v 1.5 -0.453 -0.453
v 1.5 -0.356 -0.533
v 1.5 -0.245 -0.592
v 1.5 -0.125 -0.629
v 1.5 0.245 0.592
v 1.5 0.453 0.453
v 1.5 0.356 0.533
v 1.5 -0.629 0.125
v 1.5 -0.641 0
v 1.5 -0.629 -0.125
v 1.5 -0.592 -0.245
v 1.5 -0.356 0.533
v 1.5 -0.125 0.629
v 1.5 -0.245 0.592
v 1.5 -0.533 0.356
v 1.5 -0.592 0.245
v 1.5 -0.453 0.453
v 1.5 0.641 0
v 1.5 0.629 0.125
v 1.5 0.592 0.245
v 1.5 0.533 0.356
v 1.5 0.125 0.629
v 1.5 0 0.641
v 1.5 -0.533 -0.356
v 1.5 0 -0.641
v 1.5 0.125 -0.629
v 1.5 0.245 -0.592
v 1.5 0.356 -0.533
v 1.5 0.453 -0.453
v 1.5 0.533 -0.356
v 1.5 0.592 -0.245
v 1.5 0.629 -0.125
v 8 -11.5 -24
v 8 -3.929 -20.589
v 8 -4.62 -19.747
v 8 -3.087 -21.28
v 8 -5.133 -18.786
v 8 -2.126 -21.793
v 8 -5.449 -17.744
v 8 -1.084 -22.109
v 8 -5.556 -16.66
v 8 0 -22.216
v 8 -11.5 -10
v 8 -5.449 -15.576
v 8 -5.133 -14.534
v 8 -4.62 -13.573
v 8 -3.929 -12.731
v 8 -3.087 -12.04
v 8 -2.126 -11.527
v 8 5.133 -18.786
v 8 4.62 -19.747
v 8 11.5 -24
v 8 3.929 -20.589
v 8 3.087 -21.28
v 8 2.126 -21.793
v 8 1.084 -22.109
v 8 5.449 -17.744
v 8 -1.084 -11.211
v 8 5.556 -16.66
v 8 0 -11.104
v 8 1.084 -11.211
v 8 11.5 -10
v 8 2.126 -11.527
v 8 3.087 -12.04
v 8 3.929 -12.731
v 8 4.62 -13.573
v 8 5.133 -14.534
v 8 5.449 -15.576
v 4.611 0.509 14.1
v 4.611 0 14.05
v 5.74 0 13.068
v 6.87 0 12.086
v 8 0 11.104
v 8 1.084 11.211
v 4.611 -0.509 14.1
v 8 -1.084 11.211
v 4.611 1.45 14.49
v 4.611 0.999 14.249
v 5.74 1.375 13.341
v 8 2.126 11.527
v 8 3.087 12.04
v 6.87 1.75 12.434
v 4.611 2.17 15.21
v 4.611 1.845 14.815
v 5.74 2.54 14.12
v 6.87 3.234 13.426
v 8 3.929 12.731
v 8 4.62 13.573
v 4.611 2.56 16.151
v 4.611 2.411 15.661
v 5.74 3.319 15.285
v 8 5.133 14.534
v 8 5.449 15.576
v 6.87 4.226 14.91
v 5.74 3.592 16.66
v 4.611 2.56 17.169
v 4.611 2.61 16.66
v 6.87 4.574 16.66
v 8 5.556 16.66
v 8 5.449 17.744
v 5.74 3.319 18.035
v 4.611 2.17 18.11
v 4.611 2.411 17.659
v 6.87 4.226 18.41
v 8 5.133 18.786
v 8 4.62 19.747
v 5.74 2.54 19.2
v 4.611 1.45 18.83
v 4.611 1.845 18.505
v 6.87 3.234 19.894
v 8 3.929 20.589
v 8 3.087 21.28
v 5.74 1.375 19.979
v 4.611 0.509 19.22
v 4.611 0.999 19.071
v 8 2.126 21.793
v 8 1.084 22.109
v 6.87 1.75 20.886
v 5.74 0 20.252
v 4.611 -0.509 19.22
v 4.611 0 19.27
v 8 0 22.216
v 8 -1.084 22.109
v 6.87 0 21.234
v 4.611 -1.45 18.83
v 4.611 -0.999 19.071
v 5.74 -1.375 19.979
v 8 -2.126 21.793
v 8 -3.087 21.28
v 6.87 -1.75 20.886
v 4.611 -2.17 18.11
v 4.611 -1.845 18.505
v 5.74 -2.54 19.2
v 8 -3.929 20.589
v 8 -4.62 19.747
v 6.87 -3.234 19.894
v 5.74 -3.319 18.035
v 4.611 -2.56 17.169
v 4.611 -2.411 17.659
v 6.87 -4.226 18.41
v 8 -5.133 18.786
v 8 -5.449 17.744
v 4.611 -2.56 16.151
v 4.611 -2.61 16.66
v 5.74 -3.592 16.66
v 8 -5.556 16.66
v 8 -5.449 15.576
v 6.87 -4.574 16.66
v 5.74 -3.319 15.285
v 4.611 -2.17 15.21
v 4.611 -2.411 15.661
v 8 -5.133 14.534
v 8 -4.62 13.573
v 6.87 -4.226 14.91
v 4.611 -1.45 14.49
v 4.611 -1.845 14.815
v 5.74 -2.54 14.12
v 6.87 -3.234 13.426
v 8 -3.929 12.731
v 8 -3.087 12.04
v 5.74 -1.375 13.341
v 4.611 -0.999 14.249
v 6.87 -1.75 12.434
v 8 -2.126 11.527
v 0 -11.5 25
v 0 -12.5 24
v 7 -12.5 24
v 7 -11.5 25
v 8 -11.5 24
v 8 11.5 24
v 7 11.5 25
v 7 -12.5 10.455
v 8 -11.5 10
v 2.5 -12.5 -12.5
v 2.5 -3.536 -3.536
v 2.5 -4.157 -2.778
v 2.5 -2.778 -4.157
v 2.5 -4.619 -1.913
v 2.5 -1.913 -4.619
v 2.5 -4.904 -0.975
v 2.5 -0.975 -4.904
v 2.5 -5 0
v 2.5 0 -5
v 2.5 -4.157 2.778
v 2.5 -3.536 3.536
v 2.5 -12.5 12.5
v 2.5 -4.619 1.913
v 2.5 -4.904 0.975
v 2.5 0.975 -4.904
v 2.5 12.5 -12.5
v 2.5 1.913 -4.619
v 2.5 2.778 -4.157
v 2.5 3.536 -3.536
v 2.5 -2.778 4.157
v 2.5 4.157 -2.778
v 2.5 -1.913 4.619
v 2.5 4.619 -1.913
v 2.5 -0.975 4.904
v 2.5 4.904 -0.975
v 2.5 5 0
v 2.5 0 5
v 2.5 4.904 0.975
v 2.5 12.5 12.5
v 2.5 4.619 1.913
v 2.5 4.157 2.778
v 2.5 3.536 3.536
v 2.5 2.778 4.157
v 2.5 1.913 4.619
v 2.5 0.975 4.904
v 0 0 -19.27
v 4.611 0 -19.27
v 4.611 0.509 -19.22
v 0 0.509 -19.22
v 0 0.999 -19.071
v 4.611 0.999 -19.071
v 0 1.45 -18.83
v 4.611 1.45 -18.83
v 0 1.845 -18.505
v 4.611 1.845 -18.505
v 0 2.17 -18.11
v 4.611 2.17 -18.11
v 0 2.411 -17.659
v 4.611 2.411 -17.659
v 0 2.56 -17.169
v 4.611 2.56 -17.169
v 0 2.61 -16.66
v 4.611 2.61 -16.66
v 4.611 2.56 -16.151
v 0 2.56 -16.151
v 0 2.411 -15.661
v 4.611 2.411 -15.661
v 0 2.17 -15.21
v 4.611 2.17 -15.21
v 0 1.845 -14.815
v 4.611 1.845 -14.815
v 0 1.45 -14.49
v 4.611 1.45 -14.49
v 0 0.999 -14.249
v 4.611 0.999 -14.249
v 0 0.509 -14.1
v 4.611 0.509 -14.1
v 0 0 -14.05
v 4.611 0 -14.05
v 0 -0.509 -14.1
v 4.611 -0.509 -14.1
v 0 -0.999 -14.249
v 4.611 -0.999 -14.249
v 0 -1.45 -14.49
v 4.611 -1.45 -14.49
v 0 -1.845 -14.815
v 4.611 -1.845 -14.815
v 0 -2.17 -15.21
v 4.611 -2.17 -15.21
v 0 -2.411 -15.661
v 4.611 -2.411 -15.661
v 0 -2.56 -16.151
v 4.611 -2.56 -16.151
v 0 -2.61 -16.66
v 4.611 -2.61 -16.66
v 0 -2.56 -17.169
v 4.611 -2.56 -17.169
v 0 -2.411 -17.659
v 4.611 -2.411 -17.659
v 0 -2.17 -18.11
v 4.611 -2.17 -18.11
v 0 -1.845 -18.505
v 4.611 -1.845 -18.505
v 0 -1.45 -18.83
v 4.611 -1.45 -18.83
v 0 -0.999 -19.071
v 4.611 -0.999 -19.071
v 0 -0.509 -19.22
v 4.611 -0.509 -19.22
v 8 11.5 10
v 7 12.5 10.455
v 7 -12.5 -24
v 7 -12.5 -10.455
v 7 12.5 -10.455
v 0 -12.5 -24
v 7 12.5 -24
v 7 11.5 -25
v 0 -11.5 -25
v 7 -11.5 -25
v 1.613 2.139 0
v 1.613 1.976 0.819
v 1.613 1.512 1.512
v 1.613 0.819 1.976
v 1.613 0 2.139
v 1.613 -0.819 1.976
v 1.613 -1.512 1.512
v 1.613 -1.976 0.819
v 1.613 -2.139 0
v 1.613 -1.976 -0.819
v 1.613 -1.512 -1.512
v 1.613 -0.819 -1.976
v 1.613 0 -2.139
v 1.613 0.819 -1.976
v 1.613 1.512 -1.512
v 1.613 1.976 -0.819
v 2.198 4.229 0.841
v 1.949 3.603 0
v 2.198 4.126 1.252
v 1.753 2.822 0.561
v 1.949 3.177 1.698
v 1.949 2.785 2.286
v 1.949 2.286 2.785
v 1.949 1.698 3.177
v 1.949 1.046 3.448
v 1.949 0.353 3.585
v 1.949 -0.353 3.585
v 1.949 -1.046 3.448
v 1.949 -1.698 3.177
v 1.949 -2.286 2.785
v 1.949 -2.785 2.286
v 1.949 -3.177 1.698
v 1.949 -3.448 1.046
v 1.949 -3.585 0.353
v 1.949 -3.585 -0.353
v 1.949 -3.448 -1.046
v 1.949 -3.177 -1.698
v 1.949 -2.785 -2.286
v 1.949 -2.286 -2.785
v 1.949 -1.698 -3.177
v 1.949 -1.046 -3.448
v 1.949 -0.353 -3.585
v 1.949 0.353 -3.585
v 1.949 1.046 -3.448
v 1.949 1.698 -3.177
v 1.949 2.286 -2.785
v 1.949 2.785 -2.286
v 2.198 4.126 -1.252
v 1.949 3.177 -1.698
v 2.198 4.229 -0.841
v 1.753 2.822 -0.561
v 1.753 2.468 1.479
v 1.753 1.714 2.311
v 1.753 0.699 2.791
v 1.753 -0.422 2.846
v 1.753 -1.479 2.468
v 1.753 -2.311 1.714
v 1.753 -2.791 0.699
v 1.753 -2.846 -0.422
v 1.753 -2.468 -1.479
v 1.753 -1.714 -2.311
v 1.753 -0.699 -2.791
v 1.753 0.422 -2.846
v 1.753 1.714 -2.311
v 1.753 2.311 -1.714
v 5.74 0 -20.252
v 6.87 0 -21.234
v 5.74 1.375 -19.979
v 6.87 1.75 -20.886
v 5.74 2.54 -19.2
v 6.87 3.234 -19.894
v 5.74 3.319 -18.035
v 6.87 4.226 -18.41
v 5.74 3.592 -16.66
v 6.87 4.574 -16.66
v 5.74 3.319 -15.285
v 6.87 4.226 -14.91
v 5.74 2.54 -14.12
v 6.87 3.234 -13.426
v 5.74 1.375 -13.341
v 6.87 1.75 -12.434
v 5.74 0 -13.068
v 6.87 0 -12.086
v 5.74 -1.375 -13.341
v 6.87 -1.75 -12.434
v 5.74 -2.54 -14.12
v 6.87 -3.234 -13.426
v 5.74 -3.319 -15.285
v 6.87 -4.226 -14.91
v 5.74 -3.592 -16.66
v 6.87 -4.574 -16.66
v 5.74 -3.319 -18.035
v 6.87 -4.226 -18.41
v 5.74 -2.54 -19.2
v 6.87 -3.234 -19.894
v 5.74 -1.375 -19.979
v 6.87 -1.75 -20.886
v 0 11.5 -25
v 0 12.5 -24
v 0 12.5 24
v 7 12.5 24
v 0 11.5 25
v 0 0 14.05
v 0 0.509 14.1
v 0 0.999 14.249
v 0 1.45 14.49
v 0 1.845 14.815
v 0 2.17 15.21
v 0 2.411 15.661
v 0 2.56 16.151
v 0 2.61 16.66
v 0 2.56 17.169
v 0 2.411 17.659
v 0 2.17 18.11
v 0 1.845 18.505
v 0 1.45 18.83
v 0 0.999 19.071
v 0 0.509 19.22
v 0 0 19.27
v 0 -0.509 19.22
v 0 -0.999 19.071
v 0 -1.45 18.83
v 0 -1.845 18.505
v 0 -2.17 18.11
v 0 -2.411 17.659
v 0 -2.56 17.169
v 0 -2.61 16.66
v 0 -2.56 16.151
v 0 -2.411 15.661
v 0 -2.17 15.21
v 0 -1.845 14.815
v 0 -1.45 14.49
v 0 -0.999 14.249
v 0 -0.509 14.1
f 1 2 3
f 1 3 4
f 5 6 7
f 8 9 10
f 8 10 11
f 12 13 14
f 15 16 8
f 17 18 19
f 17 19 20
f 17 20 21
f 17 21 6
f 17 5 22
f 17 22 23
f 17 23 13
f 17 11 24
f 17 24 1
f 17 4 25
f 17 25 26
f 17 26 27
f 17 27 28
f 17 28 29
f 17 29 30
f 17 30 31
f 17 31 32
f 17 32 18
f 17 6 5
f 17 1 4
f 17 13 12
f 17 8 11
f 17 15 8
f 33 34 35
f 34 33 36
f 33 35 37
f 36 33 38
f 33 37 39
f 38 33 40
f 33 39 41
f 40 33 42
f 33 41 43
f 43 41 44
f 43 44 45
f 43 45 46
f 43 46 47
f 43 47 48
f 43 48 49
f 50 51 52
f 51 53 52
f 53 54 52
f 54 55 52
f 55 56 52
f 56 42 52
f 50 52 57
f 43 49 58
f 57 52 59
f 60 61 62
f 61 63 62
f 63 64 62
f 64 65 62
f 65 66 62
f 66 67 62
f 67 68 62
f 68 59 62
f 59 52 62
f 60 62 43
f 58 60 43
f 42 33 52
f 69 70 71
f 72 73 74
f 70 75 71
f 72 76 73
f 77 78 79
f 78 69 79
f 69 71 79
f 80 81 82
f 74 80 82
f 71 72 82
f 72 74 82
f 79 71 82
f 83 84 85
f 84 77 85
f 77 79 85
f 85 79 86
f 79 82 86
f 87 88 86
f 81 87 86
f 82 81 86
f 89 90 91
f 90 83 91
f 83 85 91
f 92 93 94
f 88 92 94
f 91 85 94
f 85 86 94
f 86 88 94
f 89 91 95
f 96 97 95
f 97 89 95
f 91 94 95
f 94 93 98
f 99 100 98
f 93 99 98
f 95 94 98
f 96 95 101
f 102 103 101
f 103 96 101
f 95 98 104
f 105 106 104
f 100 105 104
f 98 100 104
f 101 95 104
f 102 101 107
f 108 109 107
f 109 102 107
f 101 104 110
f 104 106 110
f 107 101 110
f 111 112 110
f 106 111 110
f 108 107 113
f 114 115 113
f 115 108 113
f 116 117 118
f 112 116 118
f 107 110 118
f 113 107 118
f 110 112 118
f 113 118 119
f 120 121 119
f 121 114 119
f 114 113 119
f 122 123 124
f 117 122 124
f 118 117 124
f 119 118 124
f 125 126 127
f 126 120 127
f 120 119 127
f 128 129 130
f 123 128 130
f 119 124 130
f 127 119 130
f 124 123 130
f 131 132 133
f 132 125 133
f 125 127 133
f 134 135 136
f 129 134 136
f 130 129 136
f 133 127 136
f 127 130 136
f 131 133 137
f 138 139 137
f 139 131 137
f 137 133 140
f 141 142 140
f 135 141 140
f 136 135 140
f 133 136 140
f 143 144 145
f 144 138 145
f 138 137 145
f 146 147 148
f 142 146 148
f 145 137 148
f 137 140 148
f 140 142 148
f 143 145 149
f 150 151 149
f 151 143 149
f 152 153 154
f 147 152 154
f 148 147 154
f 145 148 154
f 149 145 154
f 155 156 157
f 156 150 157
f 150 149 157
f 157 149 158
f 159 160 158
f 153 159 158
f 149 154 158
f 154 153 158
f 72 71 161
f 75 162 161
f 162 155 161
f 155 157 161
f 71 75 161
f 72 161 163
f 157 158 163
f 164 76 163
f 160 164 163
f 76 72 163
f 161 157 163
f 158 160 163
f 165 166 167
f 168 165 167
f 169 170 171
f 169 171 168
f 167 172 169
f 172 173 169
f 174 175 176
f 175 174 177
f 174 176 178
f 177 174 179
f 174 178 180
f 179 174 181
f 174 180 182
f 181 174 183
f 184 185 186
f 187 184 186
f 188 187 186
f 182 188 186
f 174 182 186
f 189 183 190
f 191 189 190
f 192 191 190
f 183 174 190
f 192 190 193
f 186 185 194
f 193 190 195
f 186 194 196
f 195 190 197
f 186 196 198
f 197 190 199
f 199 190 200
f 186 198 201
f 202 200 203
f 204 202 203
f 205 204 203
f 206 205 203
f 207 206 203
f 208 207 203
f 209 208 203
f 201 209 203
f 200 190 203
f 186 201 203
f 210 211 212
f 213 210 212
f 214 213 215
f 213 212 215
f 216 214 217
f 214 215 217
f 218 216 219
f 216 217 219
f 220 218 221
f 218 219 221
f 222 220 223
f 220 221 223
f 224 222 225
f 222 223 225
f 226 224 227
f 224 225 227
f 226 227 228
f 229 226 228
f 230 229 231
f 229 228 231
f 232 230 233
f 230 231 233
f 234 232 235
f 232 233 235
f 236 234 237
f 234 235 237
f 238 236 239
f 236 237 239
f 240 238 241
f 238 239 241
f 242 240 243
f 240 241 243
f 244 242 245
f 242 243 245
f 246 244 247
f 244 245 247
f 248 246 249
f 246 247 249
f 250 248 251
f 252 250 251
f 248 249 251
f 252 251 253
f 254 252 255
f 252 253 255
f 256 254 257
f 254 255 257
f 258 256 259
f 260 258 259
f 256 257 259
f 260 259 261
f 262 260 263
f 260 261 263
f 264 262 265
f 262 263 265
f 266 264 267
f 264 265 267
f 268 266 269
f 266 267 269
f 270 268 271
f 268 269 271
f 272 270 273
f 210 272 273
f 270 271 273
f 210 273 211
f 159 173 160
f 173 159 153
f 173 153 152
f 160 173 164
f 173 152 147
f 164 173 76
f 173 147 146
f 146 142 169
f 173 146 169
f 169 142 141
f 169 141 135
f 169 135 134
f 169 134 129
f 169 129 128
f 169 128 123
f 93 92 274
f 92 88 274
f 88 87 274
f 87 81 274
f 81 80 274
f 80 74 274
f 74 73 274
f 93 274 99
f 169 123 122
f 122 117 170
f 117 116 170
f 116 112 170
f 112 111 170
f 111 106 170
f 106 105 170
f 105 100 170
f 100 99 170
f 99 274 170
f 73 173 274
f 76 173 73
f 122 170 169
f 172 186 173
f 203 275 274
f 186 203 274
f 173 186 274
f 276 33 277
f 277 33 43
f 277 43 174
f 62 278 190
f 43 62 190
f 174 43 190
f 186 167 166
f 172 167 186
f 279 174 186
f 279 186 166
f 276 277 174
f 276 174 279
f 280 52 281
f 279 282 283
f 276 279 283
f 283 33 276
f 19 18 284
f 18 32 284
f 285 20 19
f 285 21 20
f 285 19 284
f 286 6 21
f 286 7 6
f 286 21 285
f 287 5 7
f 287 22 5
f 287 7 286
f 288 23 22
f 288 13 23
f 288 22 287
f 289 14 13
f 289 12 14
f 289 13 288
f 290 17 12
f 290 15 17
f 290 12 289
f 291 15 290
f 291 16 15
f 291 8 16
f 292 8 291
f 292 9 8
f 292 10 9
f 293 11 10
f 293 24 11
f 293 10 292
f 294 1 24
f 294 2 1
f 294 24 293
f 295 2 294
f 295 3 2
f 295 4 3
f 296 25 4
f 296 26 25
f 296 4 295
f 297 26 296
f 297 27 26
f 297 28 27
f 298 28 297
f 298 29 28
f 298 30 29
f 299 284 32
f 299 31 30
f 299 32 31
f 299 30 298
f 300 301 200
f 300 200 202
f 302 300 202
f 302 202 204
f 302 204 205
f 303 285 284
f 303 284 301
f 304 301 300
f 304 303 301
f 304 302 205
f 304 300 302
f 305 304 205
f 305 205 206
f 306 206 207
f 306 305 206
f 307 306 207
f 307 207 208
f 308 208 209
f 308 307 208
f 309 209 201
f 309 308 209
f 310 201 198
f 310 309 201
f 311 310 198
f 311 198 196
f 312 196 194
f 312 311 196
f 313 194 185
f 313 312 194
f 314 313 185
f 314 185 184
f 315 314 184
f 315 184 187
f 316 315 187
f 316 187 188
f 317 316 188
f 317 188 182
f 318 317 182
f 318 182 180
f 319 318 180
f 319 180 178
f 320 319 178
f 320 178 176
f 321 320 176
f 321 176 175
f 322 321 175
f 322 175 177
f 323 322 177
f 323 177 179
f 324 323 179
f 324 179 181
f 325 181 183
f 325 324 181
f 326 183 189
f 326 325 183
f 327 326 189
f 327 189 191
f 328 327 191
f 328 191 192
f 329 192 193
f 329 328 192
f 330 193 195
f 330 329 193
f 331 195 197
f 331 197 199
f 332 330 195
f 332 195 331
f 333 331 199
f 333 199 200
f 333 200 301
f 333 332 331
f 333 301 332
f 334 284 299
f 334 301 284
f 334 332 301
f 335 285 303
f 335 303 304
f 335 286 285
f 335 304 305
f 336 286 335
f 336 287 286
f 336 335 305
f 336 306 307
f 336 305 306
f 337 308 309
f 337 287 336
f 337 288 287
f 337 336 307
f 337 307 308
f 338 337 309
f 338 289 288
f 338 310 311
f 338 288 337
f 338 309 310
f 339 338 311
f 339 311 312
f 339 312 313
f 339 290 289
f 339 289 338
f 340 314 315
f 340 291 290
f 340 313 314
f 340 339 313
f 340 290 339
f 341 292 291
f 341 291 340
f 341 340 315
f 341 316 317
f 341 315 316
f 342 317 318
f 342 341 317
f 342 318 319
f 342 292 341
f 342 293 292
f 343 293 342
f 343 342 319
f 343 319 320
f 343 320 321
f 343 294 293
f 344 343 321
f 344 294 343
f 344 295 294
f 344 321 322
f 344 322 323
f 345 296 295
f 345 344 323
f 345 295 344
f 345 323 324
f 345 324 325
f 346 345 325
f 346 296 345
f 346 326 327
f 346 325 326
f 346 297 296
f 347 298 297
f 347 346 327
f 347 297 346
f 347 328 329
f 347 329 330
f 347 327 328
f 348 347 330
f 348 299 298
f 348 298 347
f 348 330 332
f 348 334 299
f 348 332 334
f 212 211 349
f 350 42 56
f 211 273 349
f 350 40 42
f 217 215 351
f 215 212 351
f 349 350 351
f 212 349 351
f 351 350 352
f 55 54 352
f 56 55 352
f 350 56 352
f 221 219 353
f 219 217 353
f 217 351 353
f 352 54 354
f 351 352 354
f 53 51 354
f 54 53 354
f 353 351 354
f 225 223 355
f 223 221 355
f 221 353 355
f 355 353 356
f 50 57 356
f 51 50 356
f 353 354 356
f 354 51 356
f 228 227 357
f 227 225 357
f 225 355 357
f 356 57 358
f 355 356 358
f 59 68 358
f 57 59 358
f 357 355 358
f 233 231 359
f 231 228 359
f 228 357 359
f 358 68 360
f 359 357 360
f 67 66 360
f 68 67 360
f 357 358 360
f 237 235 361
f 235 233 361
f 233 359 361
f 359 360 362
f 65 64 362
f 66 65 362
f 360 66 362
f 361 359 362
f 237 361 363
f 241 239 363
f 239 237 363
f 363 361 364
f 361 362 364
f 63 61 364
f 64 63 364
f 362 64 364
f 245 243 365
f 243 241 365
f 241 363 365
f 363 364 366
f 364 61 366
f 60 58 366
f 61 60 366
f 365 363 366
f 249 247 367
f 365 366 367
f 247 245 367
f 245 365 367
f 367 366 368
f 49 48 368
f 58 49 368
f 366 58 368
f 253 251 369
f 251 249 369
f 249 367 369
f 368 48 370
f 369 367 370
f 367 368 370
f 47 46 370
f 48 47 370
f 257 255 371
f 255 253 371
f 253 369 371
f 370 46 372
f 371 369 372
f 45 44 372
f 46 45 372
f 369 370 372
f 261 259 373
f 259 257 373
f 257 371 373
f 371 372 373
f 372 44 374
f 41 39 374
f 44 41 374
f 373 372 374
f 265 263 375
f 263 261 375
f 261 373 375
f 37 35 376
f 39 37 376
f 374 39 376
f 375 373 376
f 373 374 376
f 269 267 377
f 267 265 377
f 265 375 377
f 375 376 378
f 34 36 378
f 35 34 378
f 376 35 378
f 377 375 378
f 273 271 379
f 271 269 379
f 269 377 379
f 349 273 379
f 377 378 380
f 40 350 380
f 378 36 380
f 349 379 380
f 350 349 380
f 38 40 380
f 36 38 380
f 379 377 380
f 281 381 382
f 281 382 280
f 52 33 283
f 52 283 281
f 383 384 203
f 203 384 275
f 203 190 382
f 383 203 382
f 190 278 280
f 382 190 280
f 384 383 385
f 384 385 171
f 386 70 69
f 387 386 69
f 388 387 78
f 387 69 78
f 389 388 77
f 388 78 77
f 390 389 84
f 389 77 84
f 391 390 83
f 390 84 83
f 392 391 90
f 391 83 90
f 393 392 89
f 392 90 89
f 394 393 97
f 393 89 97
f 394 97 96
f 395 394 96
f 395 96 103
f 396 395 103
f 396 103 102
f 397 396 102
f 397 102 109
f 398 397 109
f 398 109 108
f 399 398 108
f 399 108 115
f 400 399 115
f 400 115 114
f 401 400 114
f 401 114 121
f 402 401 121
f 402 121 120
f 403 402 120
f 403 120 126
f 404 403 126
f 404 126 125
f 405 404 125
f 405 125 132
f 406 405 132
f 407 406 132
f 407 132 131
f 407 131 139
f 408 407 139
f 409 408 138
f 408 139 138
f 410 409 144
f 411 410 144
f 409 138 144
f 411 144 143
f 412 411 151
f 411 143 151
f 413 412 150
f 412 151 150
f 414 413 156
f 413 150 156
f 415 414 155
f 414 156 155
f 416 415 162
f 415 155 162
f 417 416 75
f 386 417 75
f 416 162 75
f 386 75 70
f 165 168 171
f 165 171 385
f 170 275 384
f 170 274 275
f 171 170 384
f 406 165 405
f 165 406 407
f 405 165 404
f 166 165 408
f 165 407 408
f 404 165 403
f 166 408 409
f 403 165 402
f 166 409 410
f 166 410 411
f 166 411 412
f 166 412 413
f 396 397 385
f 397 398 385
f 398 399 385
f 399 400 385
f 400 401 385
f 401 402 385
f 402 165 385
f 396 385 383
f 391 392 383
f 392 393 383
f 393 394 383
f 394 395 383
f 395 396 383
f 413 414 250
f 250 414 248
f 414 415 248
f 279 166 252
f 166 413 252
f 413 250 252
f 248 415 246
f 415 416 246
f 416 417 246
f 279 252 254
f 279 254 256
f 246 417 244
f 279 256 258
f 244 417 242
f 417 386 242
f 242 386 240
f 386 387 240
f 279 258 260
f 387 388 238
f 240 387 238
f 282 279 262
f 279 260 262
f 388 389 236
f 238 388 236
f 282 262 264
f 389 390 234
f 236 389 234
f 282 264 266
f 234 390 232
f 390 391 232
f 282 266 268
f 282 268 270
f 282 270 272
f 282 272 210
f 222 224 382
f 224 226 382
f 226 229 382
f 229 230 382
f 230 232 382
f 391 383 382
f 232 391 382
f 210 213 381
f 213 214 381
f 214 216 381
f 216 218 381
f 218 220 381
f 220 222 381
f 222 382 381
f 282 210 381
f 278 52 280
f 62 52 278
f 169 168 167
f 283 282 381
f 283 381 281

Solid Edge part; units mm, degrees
sketch "Sketch1" plane through (0, 0, 0) normal (0, -1, 0) x (1, 0, 0)
  line L0 (0, 25) -> (0, -25)
  line L1 (0, -25) -> (8, -25)
  line L2 (8, -25) -> (8, -10)
  line L3 (8, -10) -> (2.5, -12.5)
  line L4 (2.5, -12.5) -> (2.5, 12.5)
  line L5 (2.5, 12.5) -> (8, 10)
  line L6 (8, 10) -> (8, 25)
  line L7 (8, 25) -> (0, 25)
  dimension "D1" = 50
  dimension "D2" = 25
  dimension "D3" = 2.5
  dimension "D4" = 15
  dimension "D5" = 15
  dimension "D6" = 8
  dimension "D7" = 8
extrude "Ajout_matière_1" add sketch "Sketch1" along normal mid plane 25
hole "Perçage_2" at (8, 0, 16.66) direction (-1, 0, 0) diameter 5.2197 end up to next countersink diameter 11.1125 countersink angle 82
hole "Hole1" at (8, 0, -16.66) direction (-1, 0, 0) diameter 5.2197 end up to next countersink diameter 11.1125 countersink angle 82
sketch "Sketch2" plane through (2.5, 0, 0) normal (1, 0, 0) x (0, 1, 0)
  circle A0 centre (0, 0) radius 5
  dimension "D1" = 10
extrude "Enlèvement_matière_1" cut sketch "Sketch2" against normal blind 1
fillet "Congé_1" radius 10 1 edges at (1.5, -5, 0)
chamfer "Chanfrein_1" distance 1 angle 45 10 edges at (4, -12.5, 25) (8, 0, 25) (8, 12.5, 17.5) (8, -12.5, 17.5) (8, -12.5, -17.5) (8, 12.5, -17.5) (8, 0, -25) (4, -12.5, -25) (4, 12.5, -25) (4, 12.5, 25)
properties material "Aluminium AU4G, 2024_T4"
